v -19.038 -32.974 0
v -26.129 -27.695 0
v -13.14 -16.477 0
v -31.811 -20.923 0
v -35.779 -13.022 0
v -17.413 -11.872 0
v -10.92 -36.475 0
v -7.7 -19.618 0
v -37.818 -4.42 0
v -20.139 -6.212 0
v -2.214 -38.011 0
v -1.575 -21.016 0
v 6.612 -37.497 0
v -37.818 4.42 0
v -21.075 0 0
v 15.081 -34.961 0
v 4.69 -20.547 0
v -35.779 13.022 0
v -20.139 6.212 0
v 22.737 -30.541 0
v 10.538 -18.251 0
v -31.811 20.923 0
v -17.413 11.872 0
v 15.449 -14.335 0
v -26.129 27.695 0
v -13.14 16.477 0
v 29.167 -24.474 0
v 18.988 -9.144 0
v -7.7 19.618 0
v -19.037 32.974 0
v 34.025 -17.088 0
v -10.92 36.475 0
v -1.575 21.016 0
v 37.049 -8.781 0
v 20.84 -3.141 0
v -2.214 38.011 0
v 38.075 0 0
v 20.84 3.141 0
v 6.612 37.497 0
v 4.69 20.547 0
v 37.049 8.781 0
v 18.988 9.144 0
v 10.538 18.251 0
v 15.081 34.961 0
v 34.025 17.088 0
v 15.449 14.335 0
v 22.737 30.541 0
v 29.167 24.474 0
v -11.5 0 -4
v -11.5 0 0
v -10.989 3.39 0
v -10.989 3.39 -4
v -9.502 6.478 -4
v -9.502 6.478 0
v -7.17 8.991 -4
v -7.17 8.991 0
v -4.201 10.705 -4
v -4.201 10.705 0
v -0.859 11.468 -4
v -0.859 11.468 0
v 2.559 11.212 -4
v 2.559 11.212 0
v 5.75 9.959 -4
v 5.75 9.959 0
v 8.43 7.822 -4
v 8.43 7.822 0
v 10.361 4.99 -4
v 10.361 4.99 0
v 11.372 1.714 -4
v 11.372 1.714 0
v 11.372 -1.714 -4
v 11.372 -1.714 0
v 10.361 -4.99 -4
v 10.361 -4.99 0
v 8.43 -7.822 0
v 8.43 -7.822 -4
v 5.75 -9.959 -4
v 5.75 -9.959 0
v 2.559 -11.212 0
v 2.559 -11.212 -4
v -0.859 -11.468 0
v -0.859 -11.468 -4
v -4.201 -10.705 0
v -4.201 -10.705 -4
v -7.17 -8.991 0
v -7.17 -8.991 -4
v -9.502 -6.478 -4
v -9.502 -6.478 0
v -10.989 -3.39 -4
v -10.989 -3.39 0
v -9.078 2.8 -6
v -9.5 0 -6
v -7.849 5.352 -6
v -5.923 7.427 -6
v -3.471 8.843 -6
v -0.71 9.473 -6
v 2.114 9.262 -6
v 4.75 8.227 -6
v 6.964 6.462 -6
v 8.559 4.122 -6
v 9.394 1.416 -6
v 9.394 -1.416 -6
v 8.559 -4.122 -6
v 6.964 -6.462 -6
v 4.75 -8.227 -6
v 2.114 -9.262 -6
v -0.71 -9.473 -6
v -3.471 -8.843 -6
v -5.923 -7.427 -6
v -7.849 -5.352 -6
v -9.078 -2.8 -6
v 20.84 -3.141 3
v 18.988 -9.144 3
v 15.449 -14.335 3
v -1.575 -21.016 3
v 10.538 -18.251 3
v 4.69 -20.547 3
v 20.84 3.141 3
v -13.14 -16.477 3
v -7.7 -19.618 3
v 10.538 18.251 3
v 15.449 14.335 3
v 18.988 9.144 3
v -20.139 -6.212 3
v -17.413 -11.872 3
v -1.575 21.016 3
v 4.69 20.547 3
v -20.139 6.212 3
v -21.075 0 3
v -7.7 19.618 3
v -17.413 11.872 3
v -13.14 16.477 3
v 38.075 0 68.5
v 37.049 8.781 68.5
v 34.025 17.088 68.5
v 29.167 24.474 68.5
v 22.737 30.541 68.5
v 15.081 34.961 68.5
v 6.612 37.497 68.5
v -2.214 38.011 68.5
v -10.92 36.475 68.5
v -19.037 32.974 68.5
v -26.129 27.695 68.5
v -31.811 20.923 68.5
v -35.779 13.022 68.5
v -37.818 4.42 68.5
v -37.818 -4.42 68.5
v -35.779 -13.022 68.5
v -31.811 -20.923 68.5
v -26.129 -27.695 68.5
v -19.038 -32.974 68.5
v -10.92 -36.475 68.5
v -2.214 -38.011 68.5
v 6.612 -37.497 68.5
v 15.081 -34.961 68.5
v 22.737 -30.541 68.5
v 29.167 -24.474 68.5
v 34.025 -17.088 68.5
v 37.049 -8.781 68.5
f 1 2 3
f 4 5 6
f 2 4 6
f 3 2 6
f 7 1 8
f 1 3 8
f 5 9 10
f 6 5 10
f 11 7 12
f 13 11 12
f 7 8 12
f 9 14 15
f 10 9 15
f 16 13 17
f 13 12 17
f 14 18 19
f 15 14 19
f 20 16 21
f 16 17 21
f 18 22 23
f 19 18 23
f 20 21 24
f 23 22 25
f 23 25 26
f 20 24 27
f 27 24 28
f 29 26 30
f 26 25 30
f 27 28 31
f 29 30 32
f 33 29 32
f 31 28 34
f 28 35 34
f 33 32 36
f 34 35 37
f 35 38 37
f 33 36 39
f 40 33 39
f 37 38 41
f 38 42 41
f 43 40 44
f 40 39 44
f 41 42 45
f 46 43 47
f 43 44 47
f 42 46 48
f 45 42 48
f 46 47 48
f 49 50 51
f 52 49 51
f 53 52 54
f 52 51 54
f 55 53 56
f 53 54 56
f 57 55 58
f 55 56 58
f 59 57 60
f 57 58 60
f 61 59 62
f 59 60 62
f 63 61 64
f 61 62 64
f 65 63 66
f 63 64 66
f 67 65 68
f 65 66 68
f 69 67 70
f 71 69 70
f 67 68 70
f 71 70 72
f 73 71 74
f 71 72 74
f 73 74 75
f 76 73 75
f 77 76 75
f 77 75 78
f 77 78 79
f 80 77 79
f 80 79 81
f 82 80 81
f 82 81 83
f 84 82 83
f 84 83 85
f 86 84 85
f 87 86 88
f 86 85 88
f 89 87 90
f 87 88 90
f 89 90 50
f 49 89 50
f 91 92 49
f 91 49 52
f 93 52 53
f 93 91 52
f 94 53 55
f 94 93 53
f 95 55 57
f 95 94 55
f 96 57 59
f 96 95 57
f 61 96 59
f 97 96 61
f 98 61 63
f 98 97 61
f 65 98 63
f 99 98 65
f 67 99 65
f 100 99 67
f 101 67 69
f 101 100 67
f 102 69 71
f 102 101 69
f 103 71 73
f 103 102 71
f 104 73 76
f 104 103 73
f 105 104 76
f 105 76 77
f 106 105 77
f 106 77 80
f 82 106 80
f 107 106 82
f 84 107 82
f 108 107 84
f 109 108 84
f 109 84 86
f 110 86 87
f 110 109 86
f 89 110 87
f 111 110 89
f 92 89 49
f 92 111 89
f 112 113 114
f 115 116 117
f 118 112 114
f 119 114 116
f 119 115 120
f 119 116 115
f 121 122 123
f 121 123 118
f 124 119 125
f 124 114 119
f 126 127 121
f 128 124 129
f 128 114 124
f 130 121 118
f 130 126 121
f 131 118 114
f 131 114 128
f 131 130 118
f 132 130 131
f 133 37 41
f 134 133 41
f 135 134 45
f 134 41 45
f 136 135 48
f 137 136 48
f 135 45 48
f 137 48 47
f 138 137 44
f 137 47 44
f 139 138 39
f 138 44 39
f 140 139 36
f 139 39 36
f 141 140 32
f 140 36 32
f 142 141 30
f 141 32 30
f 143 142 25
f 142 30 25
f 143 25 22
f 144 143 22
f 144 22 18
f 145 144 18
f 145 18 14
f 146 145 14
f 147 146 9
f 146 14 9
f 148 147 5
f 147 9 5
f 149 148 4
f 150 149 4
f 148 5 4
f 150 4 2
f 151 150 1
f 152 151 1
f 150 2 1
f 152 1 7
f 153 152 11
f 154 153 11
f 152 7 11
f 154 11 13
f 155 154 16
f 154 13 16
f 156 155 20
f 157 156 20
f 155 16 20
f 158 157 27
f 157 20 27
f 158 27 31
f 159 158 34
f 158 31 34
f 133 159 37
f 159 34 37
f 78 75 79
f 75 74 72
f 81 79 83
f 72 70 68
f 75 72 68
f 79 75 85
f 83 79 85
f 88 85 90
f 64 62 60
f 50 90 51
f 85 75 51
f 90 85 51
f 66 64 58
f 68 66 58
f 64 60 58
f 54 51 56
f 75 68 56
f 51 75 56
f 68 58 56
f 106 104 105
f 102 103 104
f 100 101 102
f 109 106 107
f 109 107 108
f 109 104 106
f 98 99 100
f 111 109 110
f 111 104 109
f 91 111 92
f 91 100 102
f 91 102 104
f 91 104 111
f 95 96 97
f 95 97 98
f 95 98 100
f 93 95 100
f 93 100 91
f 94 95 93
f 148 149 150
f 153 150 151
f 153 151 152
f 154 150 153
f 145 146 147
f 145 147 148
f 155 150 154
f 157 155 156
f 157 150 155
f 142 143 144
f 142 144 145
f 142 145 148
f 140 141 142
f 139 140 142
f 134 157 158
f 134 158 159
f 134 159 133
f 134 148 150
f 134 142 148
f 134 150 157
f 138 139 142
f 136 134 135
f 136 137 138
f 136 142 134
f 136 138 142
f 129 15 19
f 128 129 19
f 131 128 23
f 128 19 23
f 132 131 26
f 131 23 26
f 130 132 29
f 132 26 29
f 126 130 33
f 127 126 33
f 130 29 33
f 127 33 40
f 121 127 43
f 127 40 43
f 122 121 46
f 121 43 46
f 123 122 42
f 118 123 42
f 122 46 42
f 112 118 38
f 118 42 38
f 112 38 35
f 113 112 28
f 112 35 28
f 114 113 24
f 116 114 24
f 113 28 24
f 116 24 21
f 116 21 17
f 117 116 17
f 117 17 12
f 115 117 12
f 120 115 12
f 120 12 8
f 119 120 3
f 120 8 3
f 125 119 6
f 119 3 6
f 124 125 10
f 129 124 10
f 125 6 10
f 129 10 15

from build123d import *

# Parameters (mm, degrees)
SKETCH1_R           = 38.075
BOSS_EXTRUDE1_DEPTH = 68.5
SKETCH2_R           = 11.5
BOSS_EXTRUDE2_DEPTH = 6
CHAMFER1_SIZE       = 2
SKETCH3_R           = 21.075
CUT_EXTRUDE1_DEPTH  = 3


with BuildPart() as part:
    # Sketch1 → Boss-Extrude1 (new body)
    with BuildSketch(Plane.XY):
        Circle(SKETCH1_R)
    extrude(amount=BOSS_EXTRUDE1_DEPTH)

    # Sketch2 → Boss-Extrude2 (add)
    with BuildSketch(Plane(origin=(0, 0, 0), x_dir=(-1, 0, 0), z_dir=(0, 0, -1))):
        Circle(SKETCH2_R)
    extrude(amount=BOSS_EXTRUDE2_DEPTH)

    # Chamfer1
    chamfer1_edges = [part.edges().sort_by_distance(p)[0] for p in [
        (11.5, 0, -6),
    ]]
    chamfer(chamfer1_edges, length=CHAMFER1_SIZE)

    # Sketch3 → Cut-Extrude1 (cut)
    with BuildSketch(Plane(origin=(0, 0, 0), x_dir=(-1, 0, 0), z_dir=(0, 0, -1))):
        Circle(SKETCH3_R)
    extrude(amount=-CUT_EXTRUDE1_DEPTH, mode=Mode.SUBTRACT)


with BuildPart() as cut_extrude1_piece_1:
    # of the separate pieces the step leaves, piece 1, a body of its own (cut_extrude1_pieces)
    add(part.part.solids().sort_by_distance((38.075, 0, 0))[0])


with BuildPart() as cut_extrude1_piece_2:
    # of the separate pieces the step leaves, piece 2, a body of its own (cut_extrude1_pieces)
    add(part.part.solids().sort_by_distance((-11.5, 0, -4))[0])


solid = Compound([cut_extrude1_piece_1.part, cut_extrude1_piece_2.part])
